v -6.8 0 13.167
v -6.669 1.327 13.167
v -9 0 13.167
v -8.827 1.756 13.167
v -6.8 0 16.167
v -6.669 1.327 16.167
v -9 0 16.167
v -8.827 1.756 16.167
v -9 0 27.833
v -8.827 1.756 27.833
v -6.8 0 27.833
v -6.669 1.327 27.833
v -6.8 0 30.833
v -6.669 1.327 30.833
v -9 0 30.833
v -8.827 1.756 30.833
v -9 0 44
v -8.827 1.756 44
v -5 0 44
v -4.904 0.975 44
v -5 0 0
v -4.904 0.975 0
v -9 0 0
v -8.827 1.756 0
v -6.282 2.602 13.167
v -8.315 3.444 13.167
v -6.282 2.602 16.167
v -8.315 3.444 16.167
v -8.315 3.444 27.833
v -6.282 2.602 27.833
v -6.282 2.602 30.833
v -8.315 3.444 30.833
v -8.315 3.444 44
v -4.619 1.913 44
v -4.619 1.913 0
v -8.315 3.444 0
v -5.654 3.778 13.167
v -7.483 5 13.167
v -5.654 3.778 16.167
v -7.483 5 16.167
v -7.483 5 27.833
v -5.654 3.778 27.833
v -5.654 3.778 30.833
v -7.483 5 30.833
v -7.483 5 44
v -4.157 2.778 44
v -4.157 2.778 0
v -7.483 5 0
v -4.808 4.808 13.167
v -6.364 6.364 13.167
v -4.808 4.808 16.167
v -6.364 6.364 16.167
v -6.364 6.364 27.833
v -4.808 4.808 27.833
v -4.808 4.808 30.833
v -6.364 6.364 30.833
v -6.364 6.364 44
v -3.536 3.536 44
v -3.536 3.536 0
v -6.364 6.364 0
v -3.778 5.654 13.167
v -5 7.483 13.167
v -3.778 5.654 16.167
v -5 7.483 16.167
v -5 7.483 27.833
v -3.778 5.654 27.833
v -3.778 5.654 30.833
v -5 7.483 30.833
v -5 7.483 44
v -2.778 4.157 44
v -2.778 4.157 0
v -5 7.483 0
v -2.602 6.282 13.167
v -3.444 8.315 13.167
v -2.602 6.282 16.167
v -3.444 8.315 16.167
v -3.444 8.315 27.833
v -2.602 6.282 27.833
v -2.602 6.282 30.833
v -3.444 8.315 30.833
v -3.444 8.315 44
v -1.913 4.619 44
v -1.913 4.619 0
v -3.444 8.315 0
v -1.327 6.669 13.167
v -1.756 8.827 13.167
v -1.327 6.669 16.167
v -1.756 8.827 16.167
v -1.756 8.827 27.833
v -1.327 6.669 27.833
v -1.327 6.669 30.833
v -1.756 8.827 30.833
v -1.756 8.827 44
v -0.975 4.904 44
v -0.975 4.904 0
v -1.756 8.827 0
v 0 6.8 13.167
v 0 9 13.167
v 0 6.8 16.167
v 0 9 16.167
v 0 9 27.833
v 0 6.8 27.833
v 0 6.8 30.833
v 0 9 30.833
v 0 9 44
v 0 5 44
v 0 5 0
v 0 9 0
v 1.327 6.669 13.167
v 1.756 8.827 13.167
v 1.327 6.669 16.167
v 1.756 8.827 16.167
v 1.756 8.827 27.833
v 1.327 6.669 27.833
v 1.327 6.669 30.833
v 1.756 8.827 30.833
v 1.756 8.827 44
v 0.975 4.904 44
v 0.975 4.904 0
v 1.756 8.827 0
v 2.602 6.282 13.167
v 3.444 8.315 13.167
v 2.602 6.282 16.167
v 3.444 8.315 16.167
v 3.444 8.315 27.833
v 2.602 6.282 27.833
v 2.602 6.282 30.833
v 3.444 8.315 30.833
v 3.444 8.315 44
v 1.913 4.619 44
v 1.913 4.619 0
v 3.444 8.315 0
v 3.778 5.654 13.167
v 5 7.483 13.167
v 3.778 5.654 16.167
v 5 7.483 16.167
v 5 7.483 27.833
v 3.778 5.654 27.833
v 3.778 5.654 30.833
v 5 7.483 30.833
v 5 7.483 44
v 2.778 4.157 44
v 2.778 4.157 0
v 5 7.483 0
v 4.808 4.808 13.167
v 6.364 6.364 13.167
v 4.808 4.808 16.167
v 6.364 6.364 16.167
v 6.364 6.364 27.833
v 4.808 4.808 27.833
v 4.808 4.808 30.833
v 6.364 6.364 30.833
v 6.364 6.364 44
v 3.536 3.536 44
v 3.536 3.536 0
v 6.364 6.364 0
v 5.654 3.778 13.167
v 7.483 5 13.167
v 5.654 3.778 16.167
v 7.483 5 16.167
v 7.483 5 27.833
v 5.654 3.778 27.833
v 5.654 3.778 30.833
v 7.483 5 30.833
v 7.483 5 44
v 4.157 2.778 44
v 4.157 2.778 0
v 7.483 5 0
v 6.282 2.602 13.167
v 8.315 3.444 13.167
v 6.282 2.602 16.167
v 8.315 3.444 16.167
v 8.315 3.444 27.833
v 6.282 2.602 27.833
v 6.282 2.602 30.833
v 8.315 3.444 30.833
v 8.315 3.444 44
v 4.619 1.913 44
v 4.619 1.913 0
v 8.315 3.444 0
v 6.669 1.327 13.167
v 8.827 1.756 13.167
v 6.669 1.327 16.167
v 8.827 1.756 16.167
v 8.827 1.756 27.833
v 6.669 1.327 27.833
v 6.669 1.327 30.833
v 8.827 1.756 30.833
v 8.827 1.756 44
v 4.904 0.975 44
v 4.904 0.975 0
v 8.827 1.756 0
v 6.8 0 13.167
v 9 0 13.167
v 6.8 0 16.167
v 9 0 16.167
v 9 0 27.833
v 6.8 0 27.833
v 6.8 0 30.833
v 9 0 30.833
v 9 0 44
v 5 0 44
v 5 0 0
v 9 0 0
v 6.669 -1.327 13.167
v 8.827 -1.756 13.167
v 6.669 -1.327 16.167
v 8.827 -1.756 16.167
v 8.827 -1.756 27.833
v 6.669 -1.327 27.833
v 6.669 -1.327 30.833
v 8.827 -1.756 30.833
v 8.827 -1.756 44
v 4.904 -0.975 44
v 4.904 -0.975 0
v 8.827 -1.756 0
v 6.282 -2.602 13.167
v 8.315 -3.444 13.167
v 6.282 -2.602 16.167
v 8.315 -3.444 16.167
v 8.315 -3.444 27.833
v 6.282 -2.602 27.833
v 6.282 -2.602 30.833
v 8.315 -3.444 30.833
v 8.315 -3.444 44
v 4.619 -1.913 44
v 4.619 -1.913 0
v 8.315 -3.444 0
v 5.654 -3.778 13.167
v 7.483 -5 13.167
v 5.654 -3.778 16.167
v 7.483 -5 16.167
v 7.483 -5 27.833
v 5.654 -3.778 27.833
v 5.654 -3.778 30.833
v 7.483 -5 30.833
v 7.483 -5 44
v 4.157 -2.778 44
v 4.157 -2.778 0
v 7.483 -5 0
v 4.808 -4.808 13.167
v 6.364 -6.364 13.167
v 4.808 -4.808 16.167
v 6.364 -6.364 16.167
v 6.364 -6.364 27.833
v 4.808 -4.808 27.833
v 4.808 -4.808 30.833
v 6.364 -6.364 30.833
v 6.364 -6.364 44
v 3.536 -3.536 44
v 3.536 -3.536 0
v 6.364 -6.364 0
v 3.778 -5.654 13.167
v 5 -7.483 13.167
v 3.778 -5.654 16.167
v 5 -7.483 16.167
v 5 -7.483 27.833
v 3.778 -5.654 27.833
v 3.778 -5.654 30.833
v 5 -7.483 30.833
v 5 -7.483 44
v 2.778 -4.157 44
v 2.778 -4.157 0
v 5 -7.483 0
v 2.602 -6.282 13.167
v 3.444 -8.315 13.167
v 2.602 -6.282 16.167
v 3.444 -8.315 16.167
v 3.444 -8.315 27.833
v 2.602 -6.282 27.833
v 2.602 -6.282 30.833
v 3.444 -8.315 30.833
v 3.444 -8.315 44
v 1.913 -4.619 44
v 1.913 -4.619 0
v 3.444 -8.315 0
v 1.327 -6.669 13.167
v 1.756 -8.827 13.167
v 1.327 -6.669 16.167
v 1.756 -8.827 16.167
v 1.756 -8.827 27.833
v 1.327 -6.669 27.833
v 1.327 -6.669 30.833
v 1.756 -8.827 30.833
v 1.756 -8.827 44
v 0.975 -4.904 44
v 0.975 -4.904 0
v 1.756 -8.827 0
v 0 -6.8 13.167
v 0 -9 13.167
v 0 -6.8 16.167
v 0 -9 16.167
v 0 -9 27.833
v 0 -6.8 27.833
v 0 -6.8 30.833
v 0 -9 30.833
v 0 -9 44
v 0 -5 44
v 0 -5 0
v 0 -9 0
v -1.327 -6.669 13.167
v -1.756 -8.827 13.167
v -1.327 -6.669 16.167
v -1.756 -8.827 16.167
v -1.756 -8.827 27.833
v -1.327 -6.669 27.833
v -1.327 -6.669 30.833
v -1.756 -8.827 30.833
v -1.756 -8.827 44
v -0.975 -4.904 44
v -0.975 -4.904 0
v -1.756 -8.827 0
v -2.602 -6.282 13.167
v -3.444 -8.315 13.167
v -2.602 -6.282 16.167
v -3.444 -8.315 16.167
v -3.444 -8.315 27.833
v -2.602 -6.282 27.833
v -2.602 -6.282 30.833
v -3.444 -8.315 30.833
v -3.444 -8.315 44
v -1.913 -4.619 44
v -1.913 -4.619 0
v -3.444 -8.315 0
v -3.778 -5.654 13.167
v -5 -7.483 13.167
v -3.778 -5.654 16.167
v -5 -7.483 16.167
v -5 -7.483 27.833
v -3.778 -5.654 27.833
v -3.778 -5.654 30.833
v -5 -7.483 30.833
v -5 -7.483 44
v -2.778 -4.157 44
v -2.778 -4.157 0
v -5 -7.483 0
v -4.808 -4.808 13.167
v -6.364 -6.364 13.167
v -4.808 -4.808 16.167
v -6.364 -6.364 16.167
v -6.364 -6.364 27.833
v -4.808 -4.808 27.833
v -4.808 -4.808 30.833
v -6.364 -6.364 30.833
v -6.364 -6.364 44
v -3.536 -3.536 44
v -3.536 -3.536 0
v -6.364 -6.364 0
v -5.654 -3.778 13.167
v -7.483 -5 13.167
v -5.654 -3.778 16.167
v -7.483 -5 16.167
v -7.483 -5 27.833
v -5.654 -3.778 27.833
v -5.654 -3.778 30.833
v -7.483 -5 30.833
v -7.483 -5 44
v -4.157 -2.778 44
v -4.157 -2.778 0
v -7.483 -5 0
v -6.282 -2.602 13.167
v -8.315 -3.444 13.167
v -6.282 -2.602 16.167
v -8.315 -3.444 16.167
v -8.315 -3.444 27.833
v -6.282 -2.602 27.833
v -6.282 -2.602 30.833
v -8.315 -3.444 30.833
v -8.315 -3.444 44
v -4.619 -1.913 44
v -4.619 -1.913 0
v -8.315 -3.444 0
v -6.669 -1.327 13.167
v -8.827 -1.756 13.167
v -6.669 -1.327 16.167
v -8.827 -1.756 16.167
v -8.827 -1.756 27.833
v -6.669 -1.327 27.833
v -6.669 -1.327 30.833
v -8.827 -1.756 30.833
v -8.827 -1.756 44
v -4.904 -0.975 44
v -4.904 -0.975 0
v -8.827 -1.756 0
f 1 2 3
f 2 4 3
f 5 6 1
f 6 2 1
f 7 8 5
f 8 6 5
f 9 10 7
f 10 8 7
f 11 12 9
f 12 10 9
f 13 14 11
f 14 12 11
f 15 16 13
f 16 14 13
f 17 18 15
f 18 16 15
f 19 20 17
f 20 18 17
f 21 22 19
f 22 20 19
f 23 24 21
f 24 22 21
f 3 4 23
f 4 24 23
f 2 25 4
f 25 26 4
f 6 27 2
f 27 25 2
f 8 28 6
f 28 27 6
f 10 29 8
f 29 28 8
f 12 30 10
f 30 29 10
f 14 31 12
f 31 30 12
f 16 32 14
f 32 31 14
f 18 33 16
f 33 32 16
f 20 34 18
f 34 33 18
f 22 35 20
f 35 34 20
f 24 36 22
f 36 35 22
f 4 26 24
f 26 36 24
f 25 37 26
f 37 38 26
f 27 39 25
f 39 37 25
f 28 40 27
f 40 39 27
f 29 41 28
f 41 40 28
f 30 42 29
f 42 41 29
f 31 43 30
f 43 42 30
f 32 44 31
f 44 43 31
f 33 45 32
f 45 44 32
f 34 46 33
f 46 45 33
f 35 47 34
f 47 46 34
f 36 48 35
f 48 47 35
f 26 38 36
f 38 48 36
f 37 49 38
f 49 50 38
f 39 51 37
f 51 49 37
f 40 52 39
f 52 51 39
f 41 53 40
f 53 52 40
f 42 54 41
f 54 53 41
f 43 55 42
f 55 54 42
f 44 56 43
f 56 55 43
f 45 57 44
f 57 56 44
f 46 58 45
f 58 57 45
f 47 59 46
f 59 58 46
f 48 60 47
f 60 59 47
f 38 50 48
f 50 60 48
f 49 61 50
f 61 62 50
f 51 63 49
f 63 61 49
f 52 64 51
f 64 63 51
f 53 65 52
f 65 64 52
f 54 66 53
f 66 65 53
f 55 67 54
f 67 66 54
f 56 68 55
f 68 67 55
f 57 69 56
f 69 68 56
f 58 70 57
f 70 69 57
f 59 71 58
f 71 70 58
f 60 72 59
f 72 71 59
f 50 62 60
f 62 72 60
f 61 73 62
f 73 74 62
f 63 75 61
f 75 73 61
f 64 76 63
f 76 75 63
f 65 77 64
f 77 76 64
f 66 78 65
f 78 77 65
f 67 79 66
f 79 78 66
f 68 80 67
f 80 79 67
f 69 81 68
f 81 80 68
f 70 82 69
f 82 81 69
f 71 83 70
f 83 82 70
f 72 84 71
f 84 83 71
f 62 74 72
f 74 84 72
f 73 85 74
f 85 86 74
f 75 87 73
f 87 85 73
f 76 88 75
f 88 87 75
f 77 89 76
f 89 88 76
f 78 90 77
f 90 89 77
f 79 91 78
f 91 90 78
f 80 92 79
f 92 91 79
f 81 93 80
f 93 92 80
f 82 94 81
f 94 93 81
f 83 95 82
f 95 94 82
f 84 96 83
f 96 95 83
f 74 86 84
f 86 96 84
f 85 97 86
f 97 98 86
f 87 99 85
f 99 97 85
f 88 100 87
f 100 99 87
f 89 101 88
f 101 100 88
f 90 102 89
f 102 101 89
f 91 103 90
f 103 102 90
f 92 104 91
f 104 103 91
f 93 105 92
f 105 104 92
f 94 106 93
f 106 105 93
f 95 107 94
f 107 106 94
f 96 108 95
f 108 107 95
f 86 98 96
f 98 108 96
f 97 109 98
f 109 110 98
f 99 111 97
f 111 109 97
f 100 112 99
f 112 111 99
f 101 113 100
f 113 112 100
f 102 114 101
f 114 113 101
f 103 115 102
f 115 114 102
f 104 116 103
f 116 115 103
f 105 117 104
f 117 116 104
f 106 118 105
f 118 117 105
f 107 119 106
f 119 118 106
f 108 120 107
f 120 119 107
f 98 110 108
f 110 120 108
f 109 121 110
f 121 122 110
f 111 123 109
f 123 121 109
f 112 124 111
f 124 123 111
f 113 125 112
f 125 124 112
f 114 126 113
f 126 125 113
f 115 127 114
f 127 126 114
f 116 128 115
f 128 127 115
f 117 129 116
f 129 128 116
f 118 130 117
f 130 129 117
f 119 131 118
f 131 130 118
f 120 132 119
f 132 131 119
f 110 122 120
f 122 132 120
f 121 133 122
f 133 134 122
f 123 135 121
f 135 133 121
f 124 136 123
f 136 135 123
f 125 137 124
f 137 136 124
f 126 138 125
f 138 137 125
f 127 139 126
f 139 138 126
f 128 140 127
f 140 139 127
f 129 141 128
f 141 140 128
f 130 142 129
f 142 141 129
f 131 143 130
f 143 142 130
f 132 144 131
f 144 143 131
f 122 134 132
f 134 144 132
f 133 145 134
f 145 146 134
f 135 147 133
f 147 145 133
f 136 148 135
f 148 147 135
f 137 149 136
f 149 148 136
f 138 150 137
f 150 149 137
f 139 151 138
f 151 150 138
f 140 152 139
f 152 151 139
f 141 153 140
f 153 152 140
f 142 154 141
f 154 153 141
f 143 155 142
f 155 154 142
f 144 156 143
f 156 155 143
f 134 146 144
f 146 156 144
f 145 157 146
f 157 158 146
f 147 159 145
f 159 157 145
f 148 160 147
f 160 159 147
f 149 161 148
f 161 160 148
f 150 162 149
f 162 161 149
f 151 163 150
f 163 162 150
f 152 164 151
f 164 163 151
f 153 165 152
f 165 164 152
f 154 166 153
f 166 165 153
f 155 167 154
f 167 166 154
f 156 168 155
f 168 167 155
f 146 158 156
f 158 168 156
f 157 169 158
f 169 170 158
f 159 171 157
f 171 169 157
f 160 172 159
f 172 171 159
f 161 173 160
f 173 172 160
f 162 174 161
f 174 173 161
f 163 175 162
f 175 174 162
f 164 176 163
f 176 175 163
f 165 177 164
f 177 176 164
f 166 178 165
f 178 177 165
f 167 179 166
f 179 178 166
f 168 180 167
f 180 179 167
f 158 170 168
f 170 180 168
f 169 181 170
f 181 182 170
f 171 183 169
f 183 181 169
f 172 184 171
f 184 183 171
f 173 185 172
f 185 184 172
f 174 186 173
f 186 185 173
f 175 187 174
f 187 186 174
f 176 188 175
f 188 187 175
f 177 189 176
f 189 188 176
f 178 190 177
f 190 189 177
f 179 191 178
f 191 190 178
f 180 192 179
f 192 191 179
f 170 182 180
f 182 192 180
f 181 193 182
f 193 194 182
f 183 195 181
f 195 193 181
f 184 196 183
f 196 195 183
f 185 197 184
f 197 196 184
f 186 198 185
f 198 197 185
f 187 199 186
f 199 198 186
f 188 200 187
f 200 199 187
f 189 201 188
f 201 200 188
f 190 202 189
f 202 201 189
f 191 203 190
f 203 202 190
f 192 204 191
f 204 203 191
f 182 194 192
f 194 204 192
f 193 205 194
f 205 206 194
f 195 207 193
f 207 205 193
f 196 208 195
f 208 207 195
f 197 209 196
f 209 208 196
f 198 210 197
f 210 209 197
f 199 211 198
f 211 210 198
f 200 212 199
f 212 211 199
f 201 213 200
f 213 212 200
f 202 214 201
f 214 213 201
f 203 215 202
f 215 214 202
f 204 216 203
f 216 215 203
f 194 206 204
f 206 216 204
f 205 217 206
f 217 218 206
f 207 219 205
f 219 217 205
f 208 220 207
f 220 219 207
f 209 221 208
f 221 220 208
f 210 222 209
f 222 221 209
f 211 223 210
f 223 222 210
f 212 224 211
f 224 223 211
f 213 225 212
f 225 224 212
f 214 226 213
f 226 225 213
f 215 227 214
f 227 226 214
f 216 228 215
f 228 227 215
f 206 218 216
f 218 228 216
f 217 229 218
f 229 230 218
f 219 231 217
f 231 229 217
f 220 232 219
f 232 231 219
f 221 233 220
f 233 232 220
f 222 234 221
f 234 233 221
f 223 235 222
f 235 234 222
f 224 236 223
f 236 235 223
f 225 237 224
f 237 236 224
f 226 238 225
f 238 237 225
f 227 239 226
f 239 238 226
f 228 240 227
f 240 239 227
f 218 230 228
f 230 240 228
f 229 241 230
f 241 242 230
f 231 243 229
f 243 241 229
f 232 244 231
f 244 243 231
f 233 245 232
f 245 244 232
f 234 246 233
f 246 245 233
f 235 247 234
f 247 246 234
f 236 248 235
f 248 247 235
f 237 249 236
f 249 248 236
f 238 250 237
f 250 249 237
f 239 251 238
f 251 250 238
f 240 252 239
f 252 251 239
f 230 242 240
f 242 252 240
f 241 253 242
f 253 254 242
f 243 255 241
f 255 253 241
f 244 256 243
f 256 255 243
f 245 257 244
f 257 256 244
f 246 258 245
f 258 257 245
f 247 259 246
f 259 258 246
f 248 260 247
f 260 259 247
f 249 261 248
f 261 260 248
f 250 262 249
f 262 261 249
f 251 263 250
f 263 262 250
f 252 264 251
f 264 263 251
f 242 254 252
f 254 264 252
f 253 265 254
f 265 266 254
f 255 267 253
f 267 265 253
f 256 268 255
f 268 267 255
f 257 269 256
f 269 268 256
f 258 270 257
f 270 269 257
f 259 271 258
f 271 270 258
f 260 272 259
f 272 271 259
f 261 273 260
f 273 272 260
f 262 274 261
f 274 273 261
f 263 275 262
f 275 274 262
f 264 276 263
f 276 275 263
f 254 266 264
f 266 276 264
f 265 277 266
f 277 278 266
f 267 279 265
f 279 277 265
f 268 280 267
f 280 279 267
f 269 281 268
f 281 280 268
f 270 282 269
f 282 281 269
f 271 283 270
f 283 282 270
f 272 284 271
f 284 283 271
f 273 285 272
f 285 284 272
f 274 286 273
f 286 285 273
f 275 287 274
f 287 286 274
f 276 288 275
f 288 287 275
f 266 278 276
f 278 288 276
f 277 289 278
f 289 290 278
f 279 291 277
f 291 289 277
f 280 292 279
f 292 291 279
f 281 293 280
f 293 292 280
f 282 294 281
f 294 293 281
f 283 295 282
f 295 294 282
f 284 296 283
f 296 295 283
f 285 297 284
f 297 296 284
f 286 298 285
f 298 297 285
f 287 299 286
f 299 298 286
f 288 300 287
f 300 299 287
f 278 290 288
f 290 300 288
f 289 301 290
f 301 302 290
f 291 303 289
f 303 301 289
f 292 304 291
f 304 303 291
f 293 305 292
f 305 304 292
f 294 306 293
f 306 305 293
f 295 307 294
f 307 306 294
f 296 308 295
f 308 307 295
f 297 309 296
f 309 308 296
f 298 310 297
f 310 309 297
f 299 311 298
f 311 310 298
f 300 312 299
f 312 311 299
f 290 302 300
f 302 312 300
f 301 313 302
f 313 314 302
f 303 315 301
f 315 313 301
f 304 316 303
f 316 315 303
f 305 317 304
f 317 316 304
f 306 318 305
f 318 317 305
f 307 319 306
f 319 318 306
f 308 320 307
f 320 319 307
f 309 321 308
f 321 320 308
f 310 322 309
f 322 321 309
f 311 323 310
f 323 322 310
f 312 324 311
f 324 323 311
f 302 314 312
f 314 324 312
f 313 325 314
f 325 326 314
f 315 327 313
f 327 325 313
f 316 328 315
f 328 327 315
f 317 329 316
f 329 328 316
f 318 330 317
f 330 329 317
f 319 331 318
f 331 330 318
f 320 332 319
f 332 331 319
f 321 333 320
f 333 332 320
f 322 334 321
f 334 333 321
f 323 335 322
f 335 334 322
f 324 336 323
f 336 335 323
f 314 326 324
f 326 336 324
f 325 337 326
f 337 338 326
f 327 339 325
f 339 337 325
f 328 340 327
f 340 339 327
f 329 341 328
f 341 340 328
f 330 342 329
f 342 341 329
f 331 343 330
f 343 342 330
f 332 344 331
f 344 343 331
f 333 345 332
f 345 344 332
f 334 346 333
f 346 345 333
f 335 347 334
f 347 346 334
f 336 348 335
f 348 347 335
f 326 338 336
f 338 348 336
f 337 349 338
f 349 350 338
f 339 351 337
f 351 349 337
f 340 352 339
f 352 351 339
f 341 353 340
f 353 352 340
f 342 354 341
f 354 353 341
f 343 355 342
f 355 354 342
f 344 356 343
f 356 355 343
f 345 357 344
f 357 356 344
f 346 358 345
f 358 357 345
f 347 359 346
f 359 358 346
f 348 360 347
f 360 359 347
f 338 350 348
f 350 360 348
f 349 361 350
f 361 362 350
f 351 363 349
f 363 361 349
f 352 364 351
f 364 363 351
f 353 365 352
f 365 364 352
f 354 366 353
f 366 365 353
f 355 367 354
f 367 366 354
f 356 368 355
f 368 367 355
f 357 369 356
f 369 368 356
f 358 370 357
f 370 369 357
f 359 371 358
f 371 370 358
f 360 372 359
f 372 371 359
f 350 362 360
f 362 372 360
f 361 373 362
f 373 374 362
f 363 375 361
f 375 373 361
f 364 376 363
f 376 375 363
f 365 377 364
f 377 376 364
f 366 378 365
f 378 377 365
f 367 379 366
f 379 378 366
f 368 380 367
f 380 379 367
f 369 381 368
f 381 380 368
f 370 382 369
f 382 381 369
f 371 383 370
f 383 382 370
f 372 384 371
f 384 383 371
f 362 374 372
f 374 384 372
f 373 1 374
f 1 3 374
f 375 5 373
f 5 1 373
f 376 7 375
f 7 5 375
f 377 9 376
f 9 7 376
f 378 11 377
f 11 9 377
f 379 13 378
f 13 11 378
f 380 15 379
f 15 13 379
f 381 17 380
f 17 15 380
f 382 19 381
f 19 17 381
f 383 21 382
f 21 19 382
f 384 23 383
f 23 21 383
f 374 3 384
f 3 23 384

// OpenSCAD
$fn = 32;

// ----------------------------------------------------------------------
// Grooved revolve: plain_grooves, bore R5
// ----------------------------------------------------------------------

// --- parameters (mm) ---
bore_r = 5;               // bore radius
outer_r = 9;              // outer radius of the body
total_h = 44;             // overall height, Z
wall = 4;                 // radial wall thickness
groove_w = 3;             // groove width
groove_d = 2.2;           // groove depth
grooves = 2;              // number of outer grooves
fit_tol = 0.1;            // declared fit tolerance (prompt contract)
free_tol = 0.5;           // declared free tolerance (prompt contract)

bbox_x = 2 * outer_r;  // full diameter
bore_d = 2 * bore_r;  // bore diameter
body_d = 2 * outer_r;  // body diameter
revolve_angle = 360;  // full turn around the Z axis

profile = [[5, 0], [9, 0], [9, 13.167], [6.8, 13.167], [6.8, 16.167], [9, 16.167], [9, 27.833], [6.8, 27.833], [6.8, 30.833], [9, 30.833], [9, 44], [5, 44]];  // primary outline, 12 points, counter clockwise

// --- the one profile operation ---
rotate_extrude(angle = revolve_angle) polygon(points = profile);
